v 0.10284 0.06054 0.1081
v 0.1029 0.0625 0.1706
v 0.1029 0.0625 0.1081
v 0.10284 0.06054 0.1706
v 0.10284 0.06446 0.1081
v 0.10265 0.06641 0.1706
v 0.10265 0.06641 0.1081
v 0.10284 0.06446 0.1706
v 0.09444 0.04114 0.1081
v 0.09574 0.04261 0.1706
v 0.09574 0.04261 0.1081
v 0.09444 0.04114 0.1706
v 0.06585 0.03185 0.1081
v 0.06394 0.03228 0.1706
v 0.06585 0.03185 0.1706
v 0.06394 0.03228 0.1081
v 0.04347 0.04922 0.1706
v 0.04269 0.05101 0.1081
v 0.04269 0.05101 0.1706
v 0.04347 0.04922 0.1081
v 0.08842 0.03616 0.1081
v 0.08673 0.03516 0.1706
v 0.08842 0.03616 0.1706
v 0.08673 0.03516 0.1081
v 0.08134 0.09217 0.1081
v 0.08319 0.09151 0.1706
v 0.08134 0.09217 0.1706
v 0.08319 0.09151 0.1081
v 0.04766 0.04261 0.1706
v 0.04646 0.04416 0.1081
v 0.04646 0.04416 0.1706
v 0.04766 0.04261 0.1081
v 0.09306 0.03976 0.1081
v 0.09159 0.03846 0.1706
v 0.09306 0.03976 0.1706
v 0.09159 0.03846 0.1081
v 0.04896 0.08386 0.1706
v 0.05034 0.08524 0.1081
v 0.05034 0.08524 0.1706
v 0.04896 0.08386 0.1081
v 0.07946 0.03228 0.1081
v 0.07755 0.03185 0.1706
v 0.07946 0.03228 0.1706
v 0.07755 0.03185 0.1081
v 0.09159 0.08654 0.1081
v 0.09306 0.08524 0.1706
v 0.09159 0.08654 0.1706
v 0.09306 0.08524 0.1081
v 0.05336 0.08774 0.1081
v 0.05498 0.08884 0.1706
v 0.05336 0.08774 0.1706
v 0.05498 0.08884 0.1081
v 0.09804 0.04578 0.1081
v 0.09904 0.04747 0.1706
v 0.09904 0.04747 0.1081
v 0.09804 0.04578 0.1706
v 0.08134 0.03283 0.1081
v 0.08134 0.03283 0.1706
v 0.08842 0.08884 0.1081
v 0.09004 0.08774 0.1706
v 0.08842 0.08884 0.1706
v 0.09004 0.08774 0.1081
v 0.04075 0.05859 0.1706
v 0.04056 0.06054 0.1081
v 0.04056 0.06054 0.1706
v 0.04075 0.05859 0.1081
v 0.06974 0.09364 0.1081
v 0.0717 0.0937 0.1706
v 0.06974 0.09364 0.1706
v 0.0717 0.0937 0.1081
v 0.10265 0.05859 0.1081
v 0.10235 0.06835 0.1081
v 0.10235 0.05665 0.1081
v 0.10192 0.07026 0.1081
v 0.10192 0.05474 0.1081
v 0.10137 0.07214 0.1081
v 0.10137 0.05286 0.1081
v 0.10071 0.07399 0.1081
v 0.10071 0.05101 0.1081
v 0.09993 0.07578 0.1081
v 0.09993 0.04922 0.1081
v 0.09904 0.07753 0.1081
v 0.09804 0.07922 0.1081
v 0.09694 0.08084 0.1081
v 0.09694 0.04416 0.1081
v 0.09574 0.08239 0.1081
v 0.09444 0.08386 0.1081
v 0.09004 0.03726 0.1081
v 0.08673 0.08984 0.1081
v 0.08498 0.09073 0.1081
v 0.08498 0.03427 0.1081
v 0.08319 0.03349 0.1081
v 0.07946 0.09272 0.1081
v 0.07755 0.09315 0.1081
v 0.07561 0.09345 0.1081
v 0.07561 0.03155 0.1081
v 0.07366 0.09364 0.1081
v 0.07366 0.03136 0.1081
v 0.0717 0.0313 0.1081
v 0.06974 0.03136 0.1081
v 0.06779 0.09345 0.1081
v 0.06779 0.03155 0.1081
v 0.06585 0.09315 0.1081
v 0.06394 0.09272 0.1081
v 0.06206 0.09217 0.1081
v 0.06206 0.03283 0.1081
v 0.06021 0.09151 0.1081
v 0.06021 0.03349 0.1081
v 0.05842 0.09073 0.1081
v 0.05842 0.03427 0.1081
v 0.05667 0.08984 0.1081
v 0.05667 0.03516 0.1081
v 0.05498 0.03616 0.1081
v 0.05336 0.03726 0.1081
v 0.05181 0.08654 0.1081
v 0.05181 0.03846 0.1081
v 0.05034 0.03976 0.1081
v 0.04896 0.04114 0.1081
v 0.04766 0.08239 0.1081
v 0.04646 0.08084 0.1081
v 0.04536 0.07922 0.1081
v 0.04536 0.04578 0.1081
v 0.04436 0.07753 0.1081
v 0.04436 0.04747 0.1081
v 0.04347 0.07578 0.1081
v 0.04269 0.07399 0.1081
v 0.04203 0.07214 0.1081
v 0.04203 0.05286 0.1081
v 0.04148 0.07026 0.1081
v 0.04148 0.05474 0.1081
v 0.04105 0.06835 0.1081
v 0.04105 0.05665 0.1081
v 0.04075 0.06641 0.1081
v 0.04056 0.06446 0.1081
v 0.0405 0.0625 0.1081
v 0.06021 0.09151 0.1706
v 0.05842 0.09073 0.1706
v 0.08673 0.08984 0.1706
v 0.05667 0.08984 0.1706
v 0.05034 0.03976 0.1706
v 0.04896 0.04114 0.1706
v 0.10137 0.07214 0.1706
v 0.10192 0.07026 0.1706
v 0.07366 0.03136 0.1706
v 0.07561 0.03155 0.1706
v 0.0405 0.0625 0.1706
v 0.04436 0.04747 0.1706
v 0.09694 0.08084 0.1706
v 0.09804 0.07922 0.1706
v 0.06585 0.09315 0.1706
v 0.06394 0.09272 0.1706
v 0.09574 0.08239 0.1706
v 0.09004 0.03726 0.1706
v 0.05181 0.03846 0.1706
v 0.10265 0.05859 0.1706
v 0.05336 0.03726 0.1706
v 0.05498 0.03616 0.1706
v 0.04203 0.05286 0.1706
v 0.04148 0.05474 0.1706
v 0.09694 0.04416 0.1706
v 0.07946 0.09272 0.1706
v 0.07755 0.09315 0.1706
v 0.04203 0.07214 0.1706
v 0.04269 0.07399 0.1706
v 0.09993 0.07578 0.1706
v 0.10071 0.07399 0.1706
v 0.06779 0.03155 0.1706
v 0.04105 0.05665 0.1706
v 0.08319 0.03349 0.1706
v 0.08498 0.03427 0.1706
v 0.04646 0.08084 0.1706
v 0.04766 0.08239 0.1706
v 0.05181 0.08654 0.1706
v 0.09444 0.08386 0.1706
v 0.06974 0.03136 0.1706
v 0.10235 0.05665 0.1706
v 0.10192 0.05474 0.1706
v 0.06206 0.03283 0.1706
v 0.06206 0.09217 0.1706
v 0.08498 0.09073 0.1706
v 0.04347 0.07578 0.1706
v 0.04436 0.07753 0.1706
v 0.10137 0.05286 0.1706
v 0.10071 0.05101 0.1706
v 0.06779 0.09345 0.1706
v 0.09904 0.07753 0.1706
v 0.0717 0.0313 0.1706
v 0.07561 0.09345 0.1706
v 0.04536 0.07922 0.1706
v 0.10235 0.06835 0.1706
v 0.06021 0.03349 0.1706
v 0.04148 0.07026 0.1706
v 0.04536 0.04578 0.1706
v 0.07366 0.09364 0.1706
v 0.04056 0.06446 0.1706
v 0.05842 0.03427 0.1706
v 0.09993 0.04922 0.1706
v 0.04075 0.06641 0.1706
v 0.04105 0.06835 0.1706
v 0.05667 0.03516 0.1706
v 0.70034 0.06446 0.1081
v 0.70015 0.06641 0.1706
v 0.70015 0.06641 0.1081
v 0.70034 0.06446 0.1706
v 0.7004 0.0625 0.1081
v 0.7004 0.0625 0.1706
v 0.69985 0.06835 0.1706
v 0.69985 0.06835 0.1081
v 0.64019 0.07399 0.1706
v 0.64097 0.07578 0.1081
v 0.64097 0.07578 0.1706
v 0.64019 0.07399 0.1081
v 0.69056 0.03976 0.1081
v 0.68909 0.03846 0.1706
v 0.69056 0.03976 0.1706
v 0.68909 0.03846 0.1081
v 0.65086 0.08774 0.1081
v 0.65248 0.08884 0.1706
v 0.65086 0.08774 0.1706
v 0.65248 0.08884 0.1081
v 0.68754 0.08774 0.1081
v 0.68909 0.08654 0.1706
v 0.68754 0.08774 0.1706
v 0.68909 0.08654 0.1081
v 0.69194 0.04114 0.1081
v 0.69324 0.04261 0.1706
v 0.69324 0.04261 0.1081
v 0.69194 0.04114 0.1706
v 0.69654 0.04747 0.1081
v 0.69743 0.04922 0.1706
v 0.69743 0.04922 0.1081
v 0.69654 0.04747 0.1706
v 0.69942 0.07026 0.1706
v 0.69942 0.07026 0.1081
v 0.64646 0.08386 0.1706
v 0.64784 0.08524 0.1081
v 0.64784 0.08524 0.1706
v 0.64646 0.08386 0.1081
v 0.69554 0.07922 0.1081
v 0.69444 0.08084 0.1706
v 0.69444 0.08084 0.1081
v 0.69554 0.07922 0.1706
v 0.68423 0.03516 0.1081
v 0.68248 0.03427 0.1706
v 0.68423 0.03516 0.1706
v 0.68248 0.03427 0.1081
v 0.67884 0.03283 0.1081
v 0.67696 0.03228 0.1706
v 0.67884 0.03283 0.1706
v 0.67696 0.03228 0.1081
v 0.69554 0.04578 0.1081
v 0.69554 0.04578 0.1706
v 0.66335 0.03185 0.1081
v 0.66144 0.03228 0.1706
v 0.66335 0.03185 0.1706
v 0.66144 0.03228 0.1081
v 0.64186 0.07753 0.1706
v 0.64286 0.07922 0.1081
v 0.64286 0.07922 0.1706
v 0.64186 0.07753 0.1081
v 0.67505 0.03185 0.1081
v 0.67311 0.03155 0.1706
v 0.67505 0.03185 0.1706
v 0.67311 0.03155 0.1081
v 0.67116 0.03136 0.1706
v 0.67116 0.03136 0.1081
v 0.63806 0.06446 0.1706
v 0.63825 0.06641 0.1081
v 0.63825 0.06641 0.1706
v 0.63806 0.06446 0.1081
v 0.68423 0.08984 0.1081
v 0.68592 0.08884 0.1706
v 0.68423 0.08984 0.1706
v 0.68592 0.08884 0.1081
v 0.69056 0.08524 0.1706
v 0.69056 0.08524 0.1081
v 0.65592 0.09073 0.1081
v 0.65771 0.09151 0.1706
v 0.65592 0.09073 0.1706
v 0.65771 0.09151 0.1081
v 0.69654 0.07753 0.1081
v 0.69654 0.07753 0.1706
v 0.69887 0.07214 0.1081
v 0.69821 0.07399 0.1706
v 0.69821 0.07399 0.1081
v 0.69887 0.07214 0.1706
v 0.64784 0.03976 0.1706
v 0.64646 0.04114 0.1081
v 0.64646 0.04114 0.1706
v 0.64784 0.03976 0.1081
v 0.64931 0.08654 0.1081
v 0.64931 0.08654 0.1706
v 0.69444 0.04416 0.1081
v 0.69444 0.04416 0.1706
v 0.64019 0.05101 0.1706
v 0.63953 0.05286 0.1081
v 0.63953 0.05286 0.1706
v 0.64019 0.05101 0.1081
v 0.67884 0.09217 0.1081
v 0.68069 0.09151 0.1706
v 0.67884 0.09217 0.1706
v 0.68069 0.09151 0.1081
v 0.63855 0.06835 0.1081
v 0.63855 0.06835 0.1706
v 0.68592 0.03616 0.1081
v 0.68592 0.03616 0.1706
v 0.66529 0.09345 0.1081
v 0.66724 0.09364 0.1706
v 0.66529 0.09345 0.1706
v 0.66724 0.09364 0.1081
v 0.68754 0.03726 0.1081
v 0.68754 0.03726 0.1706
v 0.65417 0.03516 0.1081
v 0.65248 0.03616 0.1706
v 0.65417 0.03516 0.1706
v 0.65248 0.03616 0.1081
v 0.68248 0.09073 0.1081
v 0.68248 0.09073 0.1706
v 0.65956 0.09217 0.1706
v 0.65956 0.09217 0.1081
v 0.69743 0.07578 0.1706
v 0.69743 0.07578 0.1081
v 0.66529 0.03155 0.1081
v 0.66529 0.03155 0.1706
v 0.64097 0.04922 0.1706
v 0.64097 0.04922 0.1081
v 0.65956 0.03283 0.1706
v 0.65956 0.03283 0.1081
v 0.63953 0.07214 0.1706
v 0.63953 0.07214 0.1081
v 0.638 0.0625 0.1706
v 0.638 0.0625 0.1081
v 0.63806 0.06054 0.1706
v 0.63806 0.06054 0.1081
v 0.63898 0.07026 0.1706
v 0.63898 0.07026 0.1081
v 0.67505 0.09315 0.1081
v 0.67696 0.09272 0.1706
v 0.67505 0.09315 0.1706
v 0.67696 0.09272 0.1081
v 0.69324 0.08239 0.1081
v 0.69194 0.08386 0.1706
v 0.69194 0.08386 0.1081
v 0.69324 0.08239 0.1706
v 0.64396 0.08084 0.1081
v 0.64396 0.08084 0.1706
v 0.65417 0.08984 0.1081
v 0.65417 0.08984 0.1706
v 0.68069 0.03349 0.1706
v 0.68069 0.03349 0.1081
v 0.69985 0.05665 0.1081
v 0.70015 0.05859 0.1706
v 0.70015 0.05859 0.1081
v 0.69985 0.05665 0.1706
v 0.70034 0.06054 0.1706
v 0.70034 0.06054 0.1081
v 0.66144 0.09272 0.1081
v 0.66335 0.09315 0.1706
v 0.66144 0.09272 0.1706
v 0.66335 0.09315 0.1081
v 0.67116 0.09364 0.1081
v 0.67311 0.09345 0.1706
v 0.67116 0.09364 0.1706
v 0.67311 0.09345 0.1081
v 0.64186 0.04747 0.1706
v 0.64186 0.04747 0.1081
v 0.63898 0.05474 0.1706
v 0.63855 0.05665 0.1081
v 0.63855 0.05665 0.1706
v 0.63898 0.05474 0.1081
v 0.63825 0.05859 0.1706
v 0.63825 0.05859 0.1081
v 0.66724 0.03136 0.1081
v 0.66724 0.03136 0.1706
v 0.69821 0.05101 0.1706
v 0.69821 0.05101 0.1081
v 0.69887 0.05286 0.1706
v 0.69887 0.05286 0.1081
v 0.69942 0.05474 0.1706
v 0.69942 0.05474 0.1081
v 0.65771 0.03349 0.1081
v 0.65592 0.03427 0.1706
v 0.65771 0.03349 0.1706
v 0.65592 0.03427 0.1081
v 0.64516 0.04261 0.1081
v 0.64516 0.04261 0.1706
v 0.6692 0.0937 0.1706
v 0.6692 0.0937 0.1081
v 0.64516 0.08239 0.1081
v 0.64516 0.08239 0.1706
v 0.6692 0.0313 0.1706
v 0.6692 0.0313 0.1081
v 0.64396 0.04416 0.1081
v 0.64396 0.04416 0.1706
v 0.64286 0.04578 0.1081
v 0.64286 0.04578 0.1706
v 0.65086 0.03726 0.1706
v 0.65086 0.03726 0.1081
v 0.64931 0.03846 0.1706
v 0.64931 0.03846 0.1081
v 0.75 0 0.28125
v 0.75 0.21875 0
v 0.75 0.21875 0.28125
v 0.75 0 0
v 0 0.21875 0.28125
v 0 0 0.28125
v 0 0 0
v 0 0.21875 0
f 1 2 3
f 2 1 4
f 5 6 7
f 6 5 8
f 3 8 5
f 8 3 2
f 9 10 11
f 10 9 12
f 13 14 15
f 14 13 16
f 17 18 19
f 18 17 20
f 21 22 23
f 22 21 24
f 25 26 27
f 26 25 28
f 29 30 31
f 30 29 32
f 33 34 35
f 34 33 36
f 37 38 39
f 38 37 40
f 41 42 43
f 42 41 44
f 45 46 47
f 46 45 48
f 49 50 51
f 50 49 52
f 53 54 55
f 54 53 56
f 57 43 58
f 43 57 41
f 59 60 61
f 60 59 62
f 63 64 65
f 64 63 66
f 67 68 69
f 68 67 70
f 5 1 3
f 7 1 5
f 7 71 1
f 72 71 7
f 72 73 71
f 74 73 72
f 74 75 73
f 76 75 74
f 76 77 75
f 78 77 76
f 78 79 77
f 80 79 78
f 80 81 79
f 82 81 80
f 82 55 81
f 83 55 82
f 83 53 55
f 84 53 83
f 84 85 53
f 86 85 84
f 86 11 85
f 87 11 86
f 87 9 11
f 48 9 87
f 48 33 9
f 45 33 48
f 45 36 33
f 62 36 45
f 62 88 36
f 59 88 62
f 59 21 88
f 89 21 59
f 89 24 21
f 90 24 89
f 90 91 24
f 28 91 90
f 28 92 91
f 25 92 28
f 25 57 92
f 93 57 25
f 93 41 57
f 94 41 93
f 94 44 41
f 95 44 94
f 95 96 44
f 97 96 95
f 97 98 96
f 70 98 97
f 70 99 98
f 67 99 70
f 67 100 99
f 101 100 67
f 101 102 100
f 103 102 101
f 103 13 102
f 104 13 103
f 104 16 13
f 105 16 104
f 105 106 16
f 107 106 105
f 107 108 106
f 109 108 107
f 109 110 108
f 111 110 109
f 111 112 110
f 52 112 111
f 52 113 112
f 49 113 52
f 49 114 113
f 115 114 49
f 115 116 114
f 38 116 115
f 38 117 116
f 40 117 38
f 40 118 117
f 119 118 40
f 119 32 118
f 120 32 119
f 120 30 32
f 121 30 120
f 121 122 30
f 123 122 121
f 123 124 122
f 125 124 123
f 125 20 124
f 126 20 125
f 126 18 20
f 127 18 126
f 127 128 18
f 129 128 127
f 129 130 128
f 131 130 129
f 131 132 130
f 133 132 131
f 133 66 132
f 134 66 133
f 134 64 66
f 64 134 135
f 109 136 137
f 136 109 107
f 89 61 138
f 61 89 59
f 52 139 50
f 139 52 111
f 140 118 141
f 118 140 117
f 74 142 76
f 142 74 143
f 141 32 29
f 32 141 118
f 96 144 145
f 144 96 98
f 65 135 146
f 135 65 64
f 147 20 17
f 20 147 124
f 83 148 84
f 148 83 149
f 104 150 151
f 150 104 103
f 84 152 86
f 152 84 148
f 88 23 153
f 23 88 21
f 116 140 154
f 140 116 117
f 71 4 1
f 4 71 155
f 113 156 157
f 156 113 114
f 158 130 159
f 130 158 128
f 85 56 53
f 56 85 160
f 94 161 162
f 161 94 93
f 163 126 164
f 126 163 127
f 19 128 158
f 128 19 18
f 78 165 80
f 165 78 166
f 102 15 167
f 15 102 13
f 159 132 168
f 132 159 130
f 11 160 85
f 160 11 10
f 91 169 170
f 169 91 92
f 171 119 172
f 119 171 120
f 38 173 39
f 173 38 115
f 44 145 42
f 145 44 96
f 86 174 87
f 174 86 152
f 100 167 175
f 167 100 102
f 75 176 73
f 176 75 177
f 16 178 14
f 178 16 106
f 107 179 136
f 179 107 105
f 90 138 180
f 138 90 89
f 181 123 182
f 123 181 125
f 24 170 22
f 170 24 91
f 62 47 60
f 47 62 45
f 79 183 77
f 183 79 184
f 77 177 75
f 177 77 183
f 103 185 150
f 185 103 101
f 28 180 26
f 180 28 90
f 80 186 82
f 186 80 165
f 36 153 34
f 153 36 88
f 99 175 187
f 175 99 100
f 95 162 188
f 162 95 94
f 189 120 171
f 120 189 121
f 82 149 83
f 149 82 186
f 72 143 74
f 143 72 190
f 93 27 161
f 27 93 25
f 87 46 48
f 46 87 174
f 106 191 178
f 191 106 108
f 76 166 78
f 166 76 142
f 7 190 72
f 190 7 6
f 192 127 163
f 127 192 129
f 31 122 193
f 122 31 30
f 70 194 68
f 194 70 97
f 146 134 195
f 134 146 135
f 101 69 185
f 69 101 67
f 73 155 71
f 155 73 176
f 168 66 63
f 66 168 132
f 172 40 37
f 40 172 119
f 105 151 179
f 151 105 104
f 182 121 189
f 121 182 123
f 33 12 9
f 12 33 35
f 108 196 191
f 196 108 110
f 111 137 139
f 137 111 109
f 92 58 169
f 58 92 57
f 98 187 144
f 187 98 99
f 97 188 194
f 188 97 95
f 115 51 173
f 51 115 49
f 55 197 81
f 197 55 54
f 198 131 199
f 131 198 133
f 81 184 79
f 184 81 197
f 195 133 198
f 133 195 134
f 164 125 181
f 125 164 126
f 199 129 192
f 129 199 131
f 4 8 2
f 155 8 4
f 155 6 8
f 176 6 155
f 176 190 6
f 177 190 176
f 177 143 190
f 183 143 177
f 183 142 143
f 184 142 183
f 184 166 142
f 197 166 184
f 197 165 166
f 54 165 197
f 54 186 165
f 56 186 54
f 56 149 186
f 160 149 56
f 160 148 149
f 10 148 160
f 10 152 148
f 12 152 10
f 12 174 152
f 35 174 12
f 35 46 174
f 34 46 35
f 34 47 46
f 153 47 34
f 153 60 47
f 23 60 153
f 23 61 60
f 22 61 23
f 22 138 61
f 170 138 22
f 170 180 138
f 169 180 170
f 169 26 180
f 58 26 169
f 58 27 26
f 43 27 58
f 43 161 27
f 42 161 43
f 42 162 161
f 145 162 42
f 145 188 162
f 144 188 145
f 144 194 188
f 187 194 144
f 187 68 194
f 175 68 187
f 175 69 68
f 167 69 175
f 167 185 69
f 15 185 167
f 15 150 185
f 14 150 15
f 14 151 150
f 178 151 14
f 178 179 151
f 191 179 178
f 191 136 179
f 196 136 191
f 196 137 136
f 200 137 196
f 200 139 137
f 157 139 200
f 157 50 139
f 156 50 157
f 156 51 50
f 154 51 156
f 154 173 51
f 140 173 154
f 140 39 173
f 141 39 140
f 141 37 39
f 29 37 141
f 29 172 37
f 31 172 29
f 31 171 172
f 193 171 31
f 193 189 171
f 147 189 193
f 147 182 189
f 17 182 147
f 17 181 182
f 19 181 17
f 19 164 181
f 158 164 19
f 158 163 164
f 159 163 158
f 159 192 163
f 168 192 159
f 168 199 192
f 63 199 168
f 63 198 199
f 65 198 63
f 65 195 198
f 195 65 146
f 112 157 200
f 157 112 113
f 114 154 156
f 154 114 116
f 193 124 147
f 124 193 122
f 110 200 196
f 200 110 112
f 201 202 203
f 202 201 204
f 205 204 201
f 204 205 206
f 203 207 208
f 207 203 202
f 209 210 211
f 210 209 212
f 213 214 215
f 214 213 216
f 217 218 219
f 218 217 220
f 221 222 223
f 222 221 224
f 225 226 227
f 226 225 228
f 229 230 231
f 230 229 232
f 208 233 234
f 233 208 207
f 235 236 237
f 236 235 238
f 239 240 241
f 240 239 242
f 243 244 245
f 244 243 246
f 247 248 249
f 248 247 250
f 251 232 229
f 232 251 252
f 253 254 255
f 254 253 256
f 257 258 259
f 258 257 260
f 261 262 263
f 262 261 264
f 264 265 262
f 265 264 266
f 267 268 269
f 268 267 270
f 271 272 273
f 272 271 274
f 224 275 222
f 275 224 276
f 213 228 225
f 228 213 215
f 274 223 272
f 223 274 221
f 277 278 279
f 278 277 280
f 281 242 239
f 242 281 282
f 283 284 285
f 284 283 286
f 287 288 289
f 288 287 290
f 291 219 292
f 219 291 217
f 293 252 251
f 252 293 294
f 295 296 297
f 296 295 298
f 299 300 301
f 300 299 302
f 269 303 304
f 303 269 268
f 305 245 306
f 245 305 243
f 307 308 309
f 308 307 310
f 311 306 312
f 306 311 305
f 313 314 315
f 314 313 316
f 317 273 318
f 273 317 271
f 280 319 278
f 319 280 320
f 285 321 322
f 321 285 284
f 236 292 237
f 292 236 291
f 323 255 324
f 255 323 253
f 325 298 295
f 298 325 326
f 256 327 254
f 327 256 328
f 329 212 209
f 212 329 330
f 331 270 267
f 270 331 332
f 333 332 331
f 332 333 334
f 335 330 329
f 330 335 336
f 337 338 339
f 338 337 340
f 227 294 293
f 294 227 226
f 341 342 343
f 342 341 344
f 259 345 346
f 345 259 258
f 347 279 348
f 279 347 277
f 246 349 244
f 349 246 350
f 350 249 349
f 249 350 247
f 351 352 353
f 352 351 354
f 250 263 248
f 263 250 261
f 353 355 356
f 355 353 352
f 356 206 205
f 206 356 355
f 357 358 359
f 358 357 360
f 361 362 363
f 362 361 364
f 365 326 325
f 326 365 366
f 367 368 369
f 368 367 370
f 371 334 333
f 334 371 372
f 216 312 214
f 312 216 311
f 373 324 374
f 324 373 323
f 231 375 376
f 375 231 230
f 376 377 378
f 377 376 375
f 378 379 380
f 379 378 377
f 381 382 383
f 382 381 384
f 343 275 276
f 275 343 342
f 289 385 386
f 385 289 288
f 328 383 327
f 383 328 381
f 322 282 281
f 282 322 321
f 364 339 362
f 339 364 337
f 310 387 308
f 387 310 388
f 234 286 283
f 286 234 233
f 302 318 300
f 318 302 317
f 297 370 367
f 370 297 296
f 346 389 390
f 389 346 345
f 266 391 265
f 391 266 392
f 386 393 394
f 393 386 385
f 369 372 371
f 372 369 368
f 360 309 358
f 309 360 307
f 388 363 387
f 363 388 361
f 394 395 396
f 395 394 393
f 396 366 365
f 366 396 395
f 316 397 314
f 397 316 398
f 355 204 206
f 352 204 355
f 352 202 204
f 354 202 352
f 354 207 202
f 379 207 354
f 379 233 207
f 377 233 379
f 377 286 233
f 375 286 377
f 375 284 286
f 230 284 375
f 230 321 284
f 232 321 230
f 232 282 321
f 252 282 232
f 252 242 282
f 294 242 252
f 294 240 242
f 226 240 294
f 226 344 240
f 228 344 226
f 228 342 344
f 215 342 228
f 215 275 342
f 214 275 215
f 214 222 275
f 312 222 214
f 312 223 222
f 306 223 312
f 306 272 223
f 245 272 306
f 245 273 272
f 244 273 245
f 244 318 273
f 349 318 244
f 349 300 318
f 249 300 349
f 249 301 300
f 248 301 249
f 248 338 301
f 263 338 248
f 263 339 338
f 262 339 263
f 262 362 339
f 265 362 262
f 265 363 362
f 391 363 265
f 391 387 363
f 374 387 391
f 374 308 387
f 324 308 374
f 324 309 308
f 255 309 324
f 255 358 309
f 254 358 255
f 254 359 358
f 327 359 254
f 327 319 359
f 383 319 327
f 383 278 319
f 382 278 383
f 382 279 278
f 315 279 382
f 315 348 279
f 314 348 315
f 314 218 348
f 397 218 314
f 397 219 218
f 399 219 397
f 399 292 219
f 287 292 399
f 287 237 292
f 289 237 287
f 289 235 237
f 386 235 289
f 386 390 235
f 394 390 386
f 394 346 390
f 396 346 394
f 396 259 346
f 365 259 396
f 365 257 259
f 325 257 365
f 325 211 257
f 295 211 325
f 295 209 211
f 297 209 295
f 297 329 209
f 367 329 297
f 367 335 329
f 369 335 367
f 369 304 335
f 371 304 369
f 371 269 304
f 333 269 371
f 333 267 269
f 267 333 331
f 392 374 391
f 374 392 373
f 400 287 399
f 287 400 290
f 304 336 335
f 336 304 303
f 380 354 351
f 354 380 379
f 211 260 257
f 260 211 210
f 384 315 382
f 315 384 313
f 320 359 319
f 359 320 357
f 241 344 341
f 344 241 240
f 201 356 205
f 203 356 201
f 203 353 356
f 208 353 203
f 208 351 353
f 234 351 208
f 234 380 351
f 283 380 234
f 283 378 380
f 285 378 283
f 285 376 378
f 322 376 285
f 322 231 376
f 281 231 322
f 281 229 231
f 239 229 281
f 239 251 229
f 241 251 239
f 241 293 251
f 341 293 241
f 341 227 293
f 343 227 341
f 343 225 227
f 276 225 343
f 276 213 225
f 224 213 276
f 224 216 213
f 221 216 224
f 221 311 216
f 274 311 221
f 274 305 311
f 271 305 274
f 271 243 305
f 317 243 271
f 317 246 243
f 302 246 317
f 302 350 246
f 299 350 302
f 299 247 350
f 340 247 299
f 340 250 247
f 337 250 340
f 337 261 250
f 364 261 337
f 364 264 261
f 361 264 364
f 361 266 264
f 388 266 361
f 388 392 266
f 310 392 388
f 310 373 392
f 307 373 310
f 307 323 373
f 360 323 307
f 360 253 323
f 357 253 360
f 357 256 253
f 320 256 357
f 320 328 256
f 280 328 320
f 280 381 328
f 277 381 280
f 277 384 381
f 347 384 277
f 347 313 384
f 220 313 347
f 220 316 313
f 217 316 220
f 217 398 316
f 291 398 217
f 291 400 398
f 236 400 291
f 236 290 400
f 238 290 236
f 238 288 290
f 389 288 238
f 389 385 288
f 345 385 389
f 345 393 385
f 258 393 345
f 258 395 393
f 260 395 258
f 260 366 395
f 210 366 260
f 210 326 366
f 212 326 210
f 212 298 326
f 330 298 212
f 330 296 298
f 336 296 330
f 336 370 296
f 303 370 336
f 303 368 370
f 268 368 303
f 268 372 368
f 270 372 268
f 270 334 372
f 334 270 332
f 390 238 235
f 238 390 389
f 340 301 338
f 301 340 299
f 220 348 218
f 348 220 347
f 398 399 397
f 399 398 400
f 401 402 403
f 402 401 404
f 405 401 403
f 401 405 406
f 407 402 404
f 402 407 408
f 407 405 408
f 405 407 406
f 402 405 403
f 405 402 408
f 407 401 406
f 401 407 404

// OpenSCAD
// Parametric Variables
base_length = 0.75;
base_width = 0.21875;
base_height = 0.28125;
main_extrusion_depth = 0.2812;

cut_radius = 0.0312;
cut_depth = 0.0625;
cut_z_start = 0.1081;

hole1_x = 0.0717;
hole1_y = 0.0625;
hole2_x = 0.6692;
hole2_y = 0.0625;

$fn = 100;

// Module: Main Base Block
module main_base() {
    // Solid upper-side extrusion from base datum
    // Fills footprint to all edges with zero offset
    cube([base_length, base_width, base_height]);
}

// Module: Remove-Material Feature
module circular_cuts() {
    // Two separate circular profiles, not connected into a slot
    translate([hole1_x, hole1_y, cut_z_start])
        cylinder(h=cut_depth, r=cut_radius, center=false);
    translate([hole2_x, hole2_y, cut_z_start])
        cylinder(h=cut_depth, r=cut_radius, center=false);
}

// Main Model Assembly
difference() {
    main_base();
    circular_cuts();
}
